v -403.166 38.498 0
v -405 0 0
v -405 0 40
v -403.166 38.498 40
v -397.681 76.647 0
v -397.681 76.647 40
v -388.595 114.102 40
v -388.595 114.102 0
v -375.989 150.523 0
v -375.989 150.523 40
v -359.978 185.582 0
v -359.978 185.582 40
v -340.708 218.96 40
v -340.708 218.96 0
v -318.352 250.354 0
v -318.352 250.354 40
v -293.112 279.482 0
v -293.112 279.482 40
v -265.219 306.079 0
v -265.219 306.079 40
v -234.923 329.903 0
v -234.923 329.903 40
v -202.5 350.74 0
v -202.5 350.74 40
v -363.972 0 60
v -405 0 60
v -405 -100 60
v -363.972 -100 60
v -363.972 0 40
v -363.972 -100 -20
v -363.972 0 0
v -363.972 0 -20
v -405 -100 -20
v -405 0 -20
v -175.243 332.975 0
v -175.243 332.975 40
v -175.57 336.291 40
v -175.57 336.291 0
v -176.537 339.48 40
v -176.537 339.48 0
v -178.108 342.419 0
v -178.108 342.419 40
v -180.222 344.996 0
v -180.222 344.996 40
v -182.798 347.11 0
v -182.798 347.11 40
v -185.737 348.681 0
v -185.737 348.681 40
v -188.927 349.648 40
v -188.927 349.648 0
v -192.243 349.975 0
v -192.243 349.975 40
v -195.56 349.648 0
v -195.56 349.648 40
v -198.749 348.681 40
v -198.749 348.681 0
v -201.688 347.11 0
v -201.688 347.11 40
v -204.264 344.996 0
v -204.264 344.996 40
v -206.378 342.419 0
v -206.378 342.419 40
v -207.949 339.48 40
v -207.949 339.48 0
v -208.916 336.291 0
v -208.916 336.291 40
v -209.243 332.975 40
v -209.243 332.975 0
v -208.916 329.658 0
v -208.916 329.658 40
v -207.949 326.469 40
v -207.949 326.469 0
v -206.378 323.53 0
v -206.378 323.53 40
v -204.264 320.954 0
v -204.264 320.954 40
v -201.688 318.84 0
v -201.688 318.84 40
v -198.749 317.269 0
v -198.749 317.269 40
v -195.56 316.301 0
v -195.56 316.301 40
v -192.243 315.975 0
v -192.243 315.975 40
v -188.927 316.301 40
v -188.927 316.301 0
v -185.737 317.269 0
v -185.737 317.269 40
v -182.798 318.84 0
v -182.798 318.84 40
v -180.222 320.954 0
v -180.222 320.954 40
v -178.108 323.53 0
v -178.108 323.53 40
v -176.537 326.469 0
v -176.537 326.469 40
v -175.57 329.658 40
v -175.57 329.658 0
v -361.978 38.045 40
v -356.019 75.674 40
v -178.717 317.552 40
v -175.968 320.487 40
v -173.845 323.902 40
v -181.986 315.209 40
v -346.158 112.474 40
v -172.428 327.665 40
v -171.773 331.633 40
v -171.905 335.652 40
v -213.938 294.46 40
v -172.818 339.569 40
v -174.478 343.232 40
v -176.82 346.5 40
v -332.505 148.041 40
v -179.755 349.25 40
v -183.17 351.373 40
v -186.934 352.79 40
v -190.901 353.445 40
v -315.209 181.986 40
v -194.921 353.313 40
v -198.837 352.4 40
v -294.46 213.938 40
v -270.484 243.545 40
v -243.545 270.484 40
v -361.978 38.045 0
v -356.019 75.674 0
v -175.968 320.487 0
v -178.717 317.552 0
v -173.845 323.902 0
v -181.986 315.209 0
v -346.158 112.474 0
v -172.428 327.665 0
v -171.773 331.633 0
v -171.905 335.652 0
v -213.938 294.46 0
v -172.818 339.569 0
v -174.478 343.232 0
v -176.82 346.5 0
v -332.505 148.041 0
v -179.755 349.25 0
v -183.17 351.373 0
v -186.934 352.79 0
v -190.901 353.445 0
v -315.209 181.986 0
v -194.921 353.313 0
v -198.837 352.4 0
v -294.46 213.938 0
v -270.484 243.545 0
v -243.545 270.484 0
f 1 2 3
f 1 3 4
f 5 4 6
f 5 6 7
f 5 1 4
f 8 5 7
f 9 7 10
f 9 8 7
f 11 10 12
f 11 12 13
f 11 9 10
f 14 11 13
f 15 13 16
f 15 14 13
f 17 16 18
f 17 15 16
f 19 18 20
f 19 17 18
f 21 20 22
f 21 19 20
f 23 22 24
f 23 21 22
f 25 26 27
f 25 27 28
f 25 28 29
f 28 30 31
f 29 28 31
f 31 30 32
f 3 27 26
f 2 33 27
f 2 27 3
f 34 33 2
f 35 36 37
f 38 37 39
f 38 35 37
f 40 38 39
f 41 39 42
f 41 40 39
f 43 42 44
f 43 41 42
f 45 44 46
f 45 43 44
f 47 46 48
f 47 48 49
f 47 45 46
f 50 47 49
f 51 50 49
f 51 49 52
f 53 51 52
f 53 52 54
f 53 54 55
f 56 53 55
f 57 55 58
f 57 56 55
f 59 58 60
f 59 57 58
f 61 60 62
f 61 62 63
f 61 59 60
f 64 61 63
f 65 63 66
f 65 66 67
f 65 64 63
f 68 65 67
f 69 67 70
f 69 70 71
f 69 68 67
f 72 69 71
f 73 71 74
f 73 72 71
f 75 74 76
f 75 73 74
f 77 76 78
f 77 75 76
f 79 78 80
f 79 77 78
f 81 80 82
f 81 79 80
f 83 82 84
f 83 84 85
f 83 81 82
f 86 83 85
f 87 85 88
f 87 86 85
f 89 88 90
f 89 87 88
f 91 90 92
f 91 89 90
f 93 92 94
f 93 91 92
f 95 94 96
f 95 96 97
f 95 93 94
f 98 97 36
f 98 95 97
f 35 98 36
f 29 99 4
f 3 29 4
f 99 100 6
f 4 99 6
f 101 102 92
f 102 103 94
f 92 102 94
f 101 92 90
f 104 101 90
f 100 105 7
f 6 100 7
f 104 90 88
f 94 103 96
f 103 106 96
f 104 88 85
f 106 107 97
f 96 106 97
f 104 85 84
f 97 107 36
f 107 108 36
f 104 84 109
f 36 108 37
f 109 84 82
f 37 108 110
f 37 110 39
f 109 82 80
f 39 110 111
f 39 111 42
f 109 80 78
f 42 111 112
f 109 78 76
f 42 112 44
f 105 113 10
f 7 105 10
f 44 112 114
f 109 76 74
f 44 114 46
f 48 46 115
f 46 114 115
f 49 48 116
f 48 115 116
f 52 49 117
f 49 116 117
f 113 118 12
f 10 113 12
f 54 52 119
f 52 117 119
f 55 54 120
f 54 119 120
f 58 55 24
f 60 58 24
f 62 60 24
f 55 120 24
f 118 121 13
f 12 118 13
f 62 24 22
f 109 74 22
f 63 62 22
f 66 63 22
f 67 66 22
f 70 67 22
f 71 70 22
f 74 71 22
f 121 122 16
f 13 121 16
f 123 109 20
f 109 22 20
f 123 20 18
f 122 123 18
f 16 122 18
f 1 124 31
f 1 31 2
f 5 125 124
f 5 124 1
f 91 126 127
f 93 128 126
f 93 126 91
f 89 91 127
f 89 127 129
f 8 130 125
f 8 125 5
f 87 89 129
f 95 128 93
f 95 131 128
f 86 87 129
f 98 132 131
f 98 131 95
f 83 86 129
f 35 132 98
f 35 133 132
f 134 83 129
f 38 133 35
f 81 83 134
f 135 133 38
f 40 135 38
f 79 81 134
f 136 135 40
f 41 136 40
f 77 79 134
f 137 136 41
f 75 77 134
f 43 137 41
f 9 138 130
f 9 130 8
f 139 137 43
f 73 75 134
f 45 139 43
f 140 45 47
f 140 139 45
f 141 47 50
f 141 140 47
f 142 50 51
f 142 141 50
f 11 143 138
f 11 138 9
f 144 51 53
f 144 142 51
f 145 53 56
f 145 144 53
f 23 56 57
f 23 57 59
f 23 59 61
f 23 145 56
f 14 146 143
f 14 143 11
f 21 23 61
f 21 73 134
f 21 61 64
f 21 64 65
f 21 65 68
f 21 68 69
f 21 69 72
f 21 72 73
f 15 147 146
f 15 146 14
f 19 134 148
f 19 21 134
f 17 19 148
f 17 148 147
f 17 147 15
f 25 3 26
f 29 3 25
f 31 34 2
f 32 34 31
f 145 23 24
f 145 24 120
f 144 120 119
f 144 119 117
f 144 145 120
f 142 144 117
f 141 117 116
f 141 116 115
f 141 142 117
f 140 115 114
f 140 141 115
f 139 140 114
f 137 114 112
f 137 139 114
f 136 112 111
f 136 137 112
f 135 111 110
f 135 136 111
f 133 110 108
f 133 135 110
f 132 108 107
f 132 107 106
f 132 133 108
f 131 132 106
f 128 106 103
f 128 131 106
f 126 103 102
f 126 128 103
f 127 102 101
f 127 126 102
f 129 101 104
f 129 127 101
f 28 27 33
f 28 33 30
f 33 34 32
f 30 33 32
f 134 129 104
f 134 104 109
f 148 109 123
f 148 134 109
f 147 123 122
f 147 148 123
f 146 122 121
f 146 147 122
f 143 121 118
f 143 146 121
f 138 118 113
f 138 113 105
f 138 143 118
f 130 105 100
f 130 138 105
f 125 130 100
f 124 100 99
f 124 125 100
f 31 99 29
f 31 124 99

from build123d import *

# Parameters (mm, degrees)
SKETCH_1_R           = 17
EXTRUDE_1_DEPTH      = 40
EXTRUDE_2_DEPTH      = 60
EXTRUDE_2_DEPTH_BACK = 20
SKETCH_2_W           = 41.02774957
SKETCH_2_H           = 100


with BuildPart() as part:
    # 草图1 → 凸台-拉伸1 (new body)
    with BuildSketch(Plane.XY):
        with BuildLine():
            ThreePointArc((-181.986125215, 315.209215145), (-315.209215145, 181.986125215), (-363.97225043, 0))
            Line((-363.97225043, 0), (-405, 0))
            ThreePointArc((-405, 0), (-350.740288533, 202.5), (-202.5, 350.740288533))
            ThreePointArc((-202.5, 350.740288533), (-174.477525913, 343.231689231), (-181.986125215, 315.209215145))
        make_face()
        with Locations((-192.243062607, 332.974751839)):
            Circle(SKETCH_1_R, mode=Mode.SUBTRACT)
    extrude(amount=EXTRUDE_1_DEPTH)

    # 草图2 → 凸台-拉伸2 (add, two sides: drawn at the far end of the back side and taken through both)
    with BuildSketch(Plane.XY.offset(-EXTRUDE_2_DEPTH_BACK)):
        with Locations((-384.486125215, -50)):
            Rectangle(SKETCH_2_W, SKETCH_2_H)
    extrude(amount=EXTRUDE_2_DEPTH + EXTRUDE_2_DEPTH_BACK)


solid = part.part
